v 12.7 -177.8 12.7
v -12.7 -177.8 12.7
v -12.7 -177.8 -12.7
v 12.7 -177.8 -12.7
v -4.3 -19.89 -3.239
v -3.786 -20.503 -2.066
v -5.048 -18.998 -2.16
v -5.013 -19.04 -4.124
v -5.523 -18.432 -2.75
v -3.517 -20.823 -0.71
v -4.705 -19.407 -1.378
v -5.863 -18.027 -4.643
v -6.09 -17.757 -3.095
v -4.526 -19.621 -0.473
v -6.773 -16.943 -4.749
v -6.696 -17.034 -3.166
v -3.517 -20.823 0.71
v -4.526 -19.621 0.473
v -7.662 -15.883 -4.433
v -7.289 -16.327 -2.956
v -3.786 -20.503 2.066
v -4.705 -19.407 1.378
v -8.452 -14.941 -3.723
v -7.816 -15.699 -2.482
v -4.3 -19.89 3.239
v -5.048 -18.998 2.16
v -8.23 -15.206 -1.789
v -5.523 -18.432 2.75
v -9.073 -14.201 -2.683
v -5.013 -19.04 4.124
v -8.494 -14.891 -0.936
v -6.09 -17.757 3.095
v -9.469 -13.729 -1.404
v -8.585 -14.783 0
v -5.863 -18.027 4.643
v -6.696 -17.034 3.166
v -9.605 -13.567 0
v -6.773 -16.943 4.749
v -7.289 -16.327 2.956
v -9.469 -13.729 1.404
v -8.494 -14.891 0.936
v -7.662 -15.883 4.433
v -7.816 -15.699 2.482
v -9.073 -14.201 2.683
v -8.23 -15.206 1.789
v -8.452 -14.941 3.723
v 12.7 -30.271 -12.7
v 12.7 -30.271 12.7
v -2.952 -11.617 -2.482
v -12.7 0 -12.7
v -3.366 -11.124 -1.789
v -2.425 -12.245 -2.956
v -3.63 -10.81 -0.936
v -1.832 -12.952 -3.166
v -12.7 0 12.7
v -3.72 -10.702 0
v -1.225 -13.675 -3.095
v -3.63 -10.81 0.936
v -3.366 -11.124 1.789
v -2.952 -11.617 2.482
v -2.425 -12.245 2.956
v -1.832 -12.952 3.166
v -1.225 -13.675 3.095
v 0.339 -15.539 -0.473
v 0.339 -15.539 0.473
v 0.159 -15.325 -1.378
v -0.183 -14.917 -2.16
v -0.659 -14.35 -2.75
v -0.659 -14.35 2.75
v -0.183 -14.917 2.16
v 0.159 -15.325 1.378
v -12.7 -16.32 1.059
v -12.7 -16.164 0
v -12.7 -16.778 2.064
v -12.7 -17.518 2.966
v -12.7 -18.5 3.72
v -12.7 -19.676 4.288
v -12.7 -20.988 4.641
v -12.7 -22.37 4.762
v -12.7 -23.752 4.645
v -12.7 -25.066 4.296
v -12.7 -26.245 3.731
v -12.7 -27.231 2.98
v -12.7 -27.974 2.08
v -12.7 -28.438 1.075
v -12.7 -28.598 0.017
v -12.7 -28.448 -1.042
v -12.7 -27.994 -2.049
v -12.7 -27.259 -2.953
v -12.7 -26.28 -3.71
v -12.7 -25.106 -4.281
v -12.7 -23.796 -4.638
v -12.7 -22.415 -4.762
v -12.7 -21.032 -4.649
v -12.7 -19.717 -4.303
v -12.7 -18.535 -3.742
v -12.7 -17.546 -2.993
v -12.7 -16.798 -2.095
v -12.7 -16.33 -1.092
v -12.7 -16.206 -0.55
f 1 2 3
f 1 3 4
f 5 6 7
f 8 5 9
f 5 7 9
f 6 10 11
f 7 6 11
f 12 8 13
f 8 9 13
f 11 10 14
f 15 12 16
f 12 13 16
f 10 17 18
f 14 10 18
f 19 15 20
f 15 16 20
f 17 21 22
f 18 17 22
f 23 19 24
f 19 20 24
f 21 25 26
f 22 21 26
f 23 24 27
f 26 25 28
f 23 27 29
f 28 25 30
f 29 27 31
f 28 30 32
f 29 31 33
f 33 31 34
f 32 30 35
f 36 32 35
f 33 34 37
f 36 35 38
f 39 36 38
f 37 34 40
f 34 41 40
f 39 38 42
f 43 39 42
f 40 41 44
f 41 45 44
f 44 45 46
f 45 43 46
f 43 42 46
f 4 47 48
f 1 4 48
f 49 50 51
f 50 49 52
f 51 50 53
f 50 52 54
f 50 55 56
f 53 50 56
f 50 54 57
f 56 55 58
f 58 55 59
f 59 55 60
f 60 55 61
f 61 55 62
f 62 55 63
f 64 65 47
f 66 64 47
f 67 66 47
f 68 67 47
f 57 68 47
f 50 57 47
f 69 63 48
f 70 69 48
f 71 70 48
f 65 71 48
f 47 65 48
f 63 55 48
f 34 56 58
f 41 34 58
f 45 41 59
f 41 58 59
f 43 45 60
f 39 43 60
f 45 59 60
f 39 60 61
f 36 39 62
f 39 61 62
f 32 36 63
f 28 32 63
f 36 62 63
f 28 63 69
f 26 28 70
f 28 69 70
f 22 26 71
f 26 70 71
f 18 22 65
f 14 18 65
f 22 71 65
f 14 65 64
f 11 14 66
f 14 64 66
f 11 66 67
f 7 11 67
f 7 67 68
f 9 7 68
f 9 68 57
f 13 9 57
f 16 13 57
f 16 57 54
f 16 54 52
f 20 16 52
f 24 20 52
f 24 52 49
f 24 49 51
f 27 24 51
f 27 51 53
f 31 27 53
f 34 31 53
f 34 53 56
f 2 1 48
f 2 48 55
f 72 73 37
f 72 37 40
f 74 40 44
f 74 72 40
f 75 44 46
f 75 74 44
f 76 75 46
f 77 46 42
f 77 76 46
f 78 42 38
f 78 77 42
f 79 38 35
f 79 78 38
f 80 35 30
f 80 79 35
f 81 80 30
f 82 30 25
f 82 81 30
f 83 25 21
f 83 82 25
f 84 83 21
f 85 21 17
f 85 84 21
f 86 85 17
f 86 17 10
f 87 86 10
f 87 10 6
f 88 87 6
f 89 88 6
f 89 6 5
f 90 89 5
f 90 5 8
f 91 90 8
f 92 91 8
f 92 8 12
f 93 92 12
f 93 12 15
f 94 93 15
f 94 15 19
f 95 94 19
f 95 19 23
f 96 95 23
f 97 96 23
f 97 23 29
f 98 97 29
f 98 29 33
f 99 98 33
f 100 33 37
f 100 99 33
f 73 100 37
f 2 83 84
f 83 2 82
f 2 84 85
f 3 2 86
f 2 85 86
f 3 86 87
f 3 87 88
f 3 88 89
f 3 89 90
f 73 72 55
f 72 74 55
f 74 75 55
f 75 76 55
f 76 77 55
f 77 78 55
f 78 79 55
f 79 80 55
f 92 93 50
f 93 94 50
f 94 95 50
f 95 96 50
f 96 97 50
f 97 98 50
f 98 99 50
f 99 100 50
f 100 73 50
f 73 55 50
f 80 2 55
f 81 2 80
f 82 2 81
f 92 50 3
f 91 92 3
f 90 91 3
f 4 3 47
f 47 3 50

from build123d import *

# Parameters (mm, degrees)
F0_W     = 12.7
F0_H     = 12.7
F1_DEPTH = 177.8
F3_DEPTH = 25.401
F4_R     = 3.175
F5_DEPTH = 114.2886370023
F7_R     = 4.7625
F7_R_2   = 3.175
F8_DEPTH = 25.4


with BuildPart() as f1:
    # F0 (on Front) → F1 (new body)
    with BuildSketch(Plane.XZ):
        Polygon((12.7, -12.7), (12.7, 12.7), (-12.7, 12.7), (-12.7, -12.7), (-6.35, -12.7), (-6.35, 0), (6.35, 0), (6.35, -12.7), align=None)
        with Locations((0, -6.35)):
            Rectangle(F0_W, F0_H)
    extrude(amount=F1_DEPTH)

    # F2 (on face) → F3 (cut, through all)
    with BuildSketch(Plane.XY.offset(12.7)):
        Polygon((12.7, 0), (-12.7, 0), (12.7, -30.2705412519), align=None)
    extrude(amount=-F3_DEPTH, mode=Mode.SUBTRACT)

    # F4 (on face) → F5 (cut, through all)
    with BuildSketch(Plane(origin=(-7.4526659282, -6.2535292316, 0), x_dir=(-0.6427876097, 0.7660444431, 0), z_dir=(0.7660444431, 0.6427876097, 0))):
        with Locations((-8.981597357, 0)):
            Circle(F4_R)
    extrude(amount=-F5_DEPTH, mode=Mode.SUBTRACT)

    # F7 (on offset) → F8 (cut)
    with BuildSketch(Plane(origin=(-31.7745769972, -26.6620358392, 0), x_dir=(-0.6427876097, 0.7660444431, 0), z_dir=(0.7660444431, 0.6427876097, 0))):
        with Locations((-8.981597357, 0)):
            Circle(F7_R)
        with Locations((-8.981597357, 0)):
            Circle(F7_R_2, mode=Mode.SUBTRACT)
        with Locations((-8.981597357, 0)):
            Circle(F7_R_2)
    extrude(amount=F8_DEPTH, mode=Mode.SUBTRACT)


solid = f1.part
